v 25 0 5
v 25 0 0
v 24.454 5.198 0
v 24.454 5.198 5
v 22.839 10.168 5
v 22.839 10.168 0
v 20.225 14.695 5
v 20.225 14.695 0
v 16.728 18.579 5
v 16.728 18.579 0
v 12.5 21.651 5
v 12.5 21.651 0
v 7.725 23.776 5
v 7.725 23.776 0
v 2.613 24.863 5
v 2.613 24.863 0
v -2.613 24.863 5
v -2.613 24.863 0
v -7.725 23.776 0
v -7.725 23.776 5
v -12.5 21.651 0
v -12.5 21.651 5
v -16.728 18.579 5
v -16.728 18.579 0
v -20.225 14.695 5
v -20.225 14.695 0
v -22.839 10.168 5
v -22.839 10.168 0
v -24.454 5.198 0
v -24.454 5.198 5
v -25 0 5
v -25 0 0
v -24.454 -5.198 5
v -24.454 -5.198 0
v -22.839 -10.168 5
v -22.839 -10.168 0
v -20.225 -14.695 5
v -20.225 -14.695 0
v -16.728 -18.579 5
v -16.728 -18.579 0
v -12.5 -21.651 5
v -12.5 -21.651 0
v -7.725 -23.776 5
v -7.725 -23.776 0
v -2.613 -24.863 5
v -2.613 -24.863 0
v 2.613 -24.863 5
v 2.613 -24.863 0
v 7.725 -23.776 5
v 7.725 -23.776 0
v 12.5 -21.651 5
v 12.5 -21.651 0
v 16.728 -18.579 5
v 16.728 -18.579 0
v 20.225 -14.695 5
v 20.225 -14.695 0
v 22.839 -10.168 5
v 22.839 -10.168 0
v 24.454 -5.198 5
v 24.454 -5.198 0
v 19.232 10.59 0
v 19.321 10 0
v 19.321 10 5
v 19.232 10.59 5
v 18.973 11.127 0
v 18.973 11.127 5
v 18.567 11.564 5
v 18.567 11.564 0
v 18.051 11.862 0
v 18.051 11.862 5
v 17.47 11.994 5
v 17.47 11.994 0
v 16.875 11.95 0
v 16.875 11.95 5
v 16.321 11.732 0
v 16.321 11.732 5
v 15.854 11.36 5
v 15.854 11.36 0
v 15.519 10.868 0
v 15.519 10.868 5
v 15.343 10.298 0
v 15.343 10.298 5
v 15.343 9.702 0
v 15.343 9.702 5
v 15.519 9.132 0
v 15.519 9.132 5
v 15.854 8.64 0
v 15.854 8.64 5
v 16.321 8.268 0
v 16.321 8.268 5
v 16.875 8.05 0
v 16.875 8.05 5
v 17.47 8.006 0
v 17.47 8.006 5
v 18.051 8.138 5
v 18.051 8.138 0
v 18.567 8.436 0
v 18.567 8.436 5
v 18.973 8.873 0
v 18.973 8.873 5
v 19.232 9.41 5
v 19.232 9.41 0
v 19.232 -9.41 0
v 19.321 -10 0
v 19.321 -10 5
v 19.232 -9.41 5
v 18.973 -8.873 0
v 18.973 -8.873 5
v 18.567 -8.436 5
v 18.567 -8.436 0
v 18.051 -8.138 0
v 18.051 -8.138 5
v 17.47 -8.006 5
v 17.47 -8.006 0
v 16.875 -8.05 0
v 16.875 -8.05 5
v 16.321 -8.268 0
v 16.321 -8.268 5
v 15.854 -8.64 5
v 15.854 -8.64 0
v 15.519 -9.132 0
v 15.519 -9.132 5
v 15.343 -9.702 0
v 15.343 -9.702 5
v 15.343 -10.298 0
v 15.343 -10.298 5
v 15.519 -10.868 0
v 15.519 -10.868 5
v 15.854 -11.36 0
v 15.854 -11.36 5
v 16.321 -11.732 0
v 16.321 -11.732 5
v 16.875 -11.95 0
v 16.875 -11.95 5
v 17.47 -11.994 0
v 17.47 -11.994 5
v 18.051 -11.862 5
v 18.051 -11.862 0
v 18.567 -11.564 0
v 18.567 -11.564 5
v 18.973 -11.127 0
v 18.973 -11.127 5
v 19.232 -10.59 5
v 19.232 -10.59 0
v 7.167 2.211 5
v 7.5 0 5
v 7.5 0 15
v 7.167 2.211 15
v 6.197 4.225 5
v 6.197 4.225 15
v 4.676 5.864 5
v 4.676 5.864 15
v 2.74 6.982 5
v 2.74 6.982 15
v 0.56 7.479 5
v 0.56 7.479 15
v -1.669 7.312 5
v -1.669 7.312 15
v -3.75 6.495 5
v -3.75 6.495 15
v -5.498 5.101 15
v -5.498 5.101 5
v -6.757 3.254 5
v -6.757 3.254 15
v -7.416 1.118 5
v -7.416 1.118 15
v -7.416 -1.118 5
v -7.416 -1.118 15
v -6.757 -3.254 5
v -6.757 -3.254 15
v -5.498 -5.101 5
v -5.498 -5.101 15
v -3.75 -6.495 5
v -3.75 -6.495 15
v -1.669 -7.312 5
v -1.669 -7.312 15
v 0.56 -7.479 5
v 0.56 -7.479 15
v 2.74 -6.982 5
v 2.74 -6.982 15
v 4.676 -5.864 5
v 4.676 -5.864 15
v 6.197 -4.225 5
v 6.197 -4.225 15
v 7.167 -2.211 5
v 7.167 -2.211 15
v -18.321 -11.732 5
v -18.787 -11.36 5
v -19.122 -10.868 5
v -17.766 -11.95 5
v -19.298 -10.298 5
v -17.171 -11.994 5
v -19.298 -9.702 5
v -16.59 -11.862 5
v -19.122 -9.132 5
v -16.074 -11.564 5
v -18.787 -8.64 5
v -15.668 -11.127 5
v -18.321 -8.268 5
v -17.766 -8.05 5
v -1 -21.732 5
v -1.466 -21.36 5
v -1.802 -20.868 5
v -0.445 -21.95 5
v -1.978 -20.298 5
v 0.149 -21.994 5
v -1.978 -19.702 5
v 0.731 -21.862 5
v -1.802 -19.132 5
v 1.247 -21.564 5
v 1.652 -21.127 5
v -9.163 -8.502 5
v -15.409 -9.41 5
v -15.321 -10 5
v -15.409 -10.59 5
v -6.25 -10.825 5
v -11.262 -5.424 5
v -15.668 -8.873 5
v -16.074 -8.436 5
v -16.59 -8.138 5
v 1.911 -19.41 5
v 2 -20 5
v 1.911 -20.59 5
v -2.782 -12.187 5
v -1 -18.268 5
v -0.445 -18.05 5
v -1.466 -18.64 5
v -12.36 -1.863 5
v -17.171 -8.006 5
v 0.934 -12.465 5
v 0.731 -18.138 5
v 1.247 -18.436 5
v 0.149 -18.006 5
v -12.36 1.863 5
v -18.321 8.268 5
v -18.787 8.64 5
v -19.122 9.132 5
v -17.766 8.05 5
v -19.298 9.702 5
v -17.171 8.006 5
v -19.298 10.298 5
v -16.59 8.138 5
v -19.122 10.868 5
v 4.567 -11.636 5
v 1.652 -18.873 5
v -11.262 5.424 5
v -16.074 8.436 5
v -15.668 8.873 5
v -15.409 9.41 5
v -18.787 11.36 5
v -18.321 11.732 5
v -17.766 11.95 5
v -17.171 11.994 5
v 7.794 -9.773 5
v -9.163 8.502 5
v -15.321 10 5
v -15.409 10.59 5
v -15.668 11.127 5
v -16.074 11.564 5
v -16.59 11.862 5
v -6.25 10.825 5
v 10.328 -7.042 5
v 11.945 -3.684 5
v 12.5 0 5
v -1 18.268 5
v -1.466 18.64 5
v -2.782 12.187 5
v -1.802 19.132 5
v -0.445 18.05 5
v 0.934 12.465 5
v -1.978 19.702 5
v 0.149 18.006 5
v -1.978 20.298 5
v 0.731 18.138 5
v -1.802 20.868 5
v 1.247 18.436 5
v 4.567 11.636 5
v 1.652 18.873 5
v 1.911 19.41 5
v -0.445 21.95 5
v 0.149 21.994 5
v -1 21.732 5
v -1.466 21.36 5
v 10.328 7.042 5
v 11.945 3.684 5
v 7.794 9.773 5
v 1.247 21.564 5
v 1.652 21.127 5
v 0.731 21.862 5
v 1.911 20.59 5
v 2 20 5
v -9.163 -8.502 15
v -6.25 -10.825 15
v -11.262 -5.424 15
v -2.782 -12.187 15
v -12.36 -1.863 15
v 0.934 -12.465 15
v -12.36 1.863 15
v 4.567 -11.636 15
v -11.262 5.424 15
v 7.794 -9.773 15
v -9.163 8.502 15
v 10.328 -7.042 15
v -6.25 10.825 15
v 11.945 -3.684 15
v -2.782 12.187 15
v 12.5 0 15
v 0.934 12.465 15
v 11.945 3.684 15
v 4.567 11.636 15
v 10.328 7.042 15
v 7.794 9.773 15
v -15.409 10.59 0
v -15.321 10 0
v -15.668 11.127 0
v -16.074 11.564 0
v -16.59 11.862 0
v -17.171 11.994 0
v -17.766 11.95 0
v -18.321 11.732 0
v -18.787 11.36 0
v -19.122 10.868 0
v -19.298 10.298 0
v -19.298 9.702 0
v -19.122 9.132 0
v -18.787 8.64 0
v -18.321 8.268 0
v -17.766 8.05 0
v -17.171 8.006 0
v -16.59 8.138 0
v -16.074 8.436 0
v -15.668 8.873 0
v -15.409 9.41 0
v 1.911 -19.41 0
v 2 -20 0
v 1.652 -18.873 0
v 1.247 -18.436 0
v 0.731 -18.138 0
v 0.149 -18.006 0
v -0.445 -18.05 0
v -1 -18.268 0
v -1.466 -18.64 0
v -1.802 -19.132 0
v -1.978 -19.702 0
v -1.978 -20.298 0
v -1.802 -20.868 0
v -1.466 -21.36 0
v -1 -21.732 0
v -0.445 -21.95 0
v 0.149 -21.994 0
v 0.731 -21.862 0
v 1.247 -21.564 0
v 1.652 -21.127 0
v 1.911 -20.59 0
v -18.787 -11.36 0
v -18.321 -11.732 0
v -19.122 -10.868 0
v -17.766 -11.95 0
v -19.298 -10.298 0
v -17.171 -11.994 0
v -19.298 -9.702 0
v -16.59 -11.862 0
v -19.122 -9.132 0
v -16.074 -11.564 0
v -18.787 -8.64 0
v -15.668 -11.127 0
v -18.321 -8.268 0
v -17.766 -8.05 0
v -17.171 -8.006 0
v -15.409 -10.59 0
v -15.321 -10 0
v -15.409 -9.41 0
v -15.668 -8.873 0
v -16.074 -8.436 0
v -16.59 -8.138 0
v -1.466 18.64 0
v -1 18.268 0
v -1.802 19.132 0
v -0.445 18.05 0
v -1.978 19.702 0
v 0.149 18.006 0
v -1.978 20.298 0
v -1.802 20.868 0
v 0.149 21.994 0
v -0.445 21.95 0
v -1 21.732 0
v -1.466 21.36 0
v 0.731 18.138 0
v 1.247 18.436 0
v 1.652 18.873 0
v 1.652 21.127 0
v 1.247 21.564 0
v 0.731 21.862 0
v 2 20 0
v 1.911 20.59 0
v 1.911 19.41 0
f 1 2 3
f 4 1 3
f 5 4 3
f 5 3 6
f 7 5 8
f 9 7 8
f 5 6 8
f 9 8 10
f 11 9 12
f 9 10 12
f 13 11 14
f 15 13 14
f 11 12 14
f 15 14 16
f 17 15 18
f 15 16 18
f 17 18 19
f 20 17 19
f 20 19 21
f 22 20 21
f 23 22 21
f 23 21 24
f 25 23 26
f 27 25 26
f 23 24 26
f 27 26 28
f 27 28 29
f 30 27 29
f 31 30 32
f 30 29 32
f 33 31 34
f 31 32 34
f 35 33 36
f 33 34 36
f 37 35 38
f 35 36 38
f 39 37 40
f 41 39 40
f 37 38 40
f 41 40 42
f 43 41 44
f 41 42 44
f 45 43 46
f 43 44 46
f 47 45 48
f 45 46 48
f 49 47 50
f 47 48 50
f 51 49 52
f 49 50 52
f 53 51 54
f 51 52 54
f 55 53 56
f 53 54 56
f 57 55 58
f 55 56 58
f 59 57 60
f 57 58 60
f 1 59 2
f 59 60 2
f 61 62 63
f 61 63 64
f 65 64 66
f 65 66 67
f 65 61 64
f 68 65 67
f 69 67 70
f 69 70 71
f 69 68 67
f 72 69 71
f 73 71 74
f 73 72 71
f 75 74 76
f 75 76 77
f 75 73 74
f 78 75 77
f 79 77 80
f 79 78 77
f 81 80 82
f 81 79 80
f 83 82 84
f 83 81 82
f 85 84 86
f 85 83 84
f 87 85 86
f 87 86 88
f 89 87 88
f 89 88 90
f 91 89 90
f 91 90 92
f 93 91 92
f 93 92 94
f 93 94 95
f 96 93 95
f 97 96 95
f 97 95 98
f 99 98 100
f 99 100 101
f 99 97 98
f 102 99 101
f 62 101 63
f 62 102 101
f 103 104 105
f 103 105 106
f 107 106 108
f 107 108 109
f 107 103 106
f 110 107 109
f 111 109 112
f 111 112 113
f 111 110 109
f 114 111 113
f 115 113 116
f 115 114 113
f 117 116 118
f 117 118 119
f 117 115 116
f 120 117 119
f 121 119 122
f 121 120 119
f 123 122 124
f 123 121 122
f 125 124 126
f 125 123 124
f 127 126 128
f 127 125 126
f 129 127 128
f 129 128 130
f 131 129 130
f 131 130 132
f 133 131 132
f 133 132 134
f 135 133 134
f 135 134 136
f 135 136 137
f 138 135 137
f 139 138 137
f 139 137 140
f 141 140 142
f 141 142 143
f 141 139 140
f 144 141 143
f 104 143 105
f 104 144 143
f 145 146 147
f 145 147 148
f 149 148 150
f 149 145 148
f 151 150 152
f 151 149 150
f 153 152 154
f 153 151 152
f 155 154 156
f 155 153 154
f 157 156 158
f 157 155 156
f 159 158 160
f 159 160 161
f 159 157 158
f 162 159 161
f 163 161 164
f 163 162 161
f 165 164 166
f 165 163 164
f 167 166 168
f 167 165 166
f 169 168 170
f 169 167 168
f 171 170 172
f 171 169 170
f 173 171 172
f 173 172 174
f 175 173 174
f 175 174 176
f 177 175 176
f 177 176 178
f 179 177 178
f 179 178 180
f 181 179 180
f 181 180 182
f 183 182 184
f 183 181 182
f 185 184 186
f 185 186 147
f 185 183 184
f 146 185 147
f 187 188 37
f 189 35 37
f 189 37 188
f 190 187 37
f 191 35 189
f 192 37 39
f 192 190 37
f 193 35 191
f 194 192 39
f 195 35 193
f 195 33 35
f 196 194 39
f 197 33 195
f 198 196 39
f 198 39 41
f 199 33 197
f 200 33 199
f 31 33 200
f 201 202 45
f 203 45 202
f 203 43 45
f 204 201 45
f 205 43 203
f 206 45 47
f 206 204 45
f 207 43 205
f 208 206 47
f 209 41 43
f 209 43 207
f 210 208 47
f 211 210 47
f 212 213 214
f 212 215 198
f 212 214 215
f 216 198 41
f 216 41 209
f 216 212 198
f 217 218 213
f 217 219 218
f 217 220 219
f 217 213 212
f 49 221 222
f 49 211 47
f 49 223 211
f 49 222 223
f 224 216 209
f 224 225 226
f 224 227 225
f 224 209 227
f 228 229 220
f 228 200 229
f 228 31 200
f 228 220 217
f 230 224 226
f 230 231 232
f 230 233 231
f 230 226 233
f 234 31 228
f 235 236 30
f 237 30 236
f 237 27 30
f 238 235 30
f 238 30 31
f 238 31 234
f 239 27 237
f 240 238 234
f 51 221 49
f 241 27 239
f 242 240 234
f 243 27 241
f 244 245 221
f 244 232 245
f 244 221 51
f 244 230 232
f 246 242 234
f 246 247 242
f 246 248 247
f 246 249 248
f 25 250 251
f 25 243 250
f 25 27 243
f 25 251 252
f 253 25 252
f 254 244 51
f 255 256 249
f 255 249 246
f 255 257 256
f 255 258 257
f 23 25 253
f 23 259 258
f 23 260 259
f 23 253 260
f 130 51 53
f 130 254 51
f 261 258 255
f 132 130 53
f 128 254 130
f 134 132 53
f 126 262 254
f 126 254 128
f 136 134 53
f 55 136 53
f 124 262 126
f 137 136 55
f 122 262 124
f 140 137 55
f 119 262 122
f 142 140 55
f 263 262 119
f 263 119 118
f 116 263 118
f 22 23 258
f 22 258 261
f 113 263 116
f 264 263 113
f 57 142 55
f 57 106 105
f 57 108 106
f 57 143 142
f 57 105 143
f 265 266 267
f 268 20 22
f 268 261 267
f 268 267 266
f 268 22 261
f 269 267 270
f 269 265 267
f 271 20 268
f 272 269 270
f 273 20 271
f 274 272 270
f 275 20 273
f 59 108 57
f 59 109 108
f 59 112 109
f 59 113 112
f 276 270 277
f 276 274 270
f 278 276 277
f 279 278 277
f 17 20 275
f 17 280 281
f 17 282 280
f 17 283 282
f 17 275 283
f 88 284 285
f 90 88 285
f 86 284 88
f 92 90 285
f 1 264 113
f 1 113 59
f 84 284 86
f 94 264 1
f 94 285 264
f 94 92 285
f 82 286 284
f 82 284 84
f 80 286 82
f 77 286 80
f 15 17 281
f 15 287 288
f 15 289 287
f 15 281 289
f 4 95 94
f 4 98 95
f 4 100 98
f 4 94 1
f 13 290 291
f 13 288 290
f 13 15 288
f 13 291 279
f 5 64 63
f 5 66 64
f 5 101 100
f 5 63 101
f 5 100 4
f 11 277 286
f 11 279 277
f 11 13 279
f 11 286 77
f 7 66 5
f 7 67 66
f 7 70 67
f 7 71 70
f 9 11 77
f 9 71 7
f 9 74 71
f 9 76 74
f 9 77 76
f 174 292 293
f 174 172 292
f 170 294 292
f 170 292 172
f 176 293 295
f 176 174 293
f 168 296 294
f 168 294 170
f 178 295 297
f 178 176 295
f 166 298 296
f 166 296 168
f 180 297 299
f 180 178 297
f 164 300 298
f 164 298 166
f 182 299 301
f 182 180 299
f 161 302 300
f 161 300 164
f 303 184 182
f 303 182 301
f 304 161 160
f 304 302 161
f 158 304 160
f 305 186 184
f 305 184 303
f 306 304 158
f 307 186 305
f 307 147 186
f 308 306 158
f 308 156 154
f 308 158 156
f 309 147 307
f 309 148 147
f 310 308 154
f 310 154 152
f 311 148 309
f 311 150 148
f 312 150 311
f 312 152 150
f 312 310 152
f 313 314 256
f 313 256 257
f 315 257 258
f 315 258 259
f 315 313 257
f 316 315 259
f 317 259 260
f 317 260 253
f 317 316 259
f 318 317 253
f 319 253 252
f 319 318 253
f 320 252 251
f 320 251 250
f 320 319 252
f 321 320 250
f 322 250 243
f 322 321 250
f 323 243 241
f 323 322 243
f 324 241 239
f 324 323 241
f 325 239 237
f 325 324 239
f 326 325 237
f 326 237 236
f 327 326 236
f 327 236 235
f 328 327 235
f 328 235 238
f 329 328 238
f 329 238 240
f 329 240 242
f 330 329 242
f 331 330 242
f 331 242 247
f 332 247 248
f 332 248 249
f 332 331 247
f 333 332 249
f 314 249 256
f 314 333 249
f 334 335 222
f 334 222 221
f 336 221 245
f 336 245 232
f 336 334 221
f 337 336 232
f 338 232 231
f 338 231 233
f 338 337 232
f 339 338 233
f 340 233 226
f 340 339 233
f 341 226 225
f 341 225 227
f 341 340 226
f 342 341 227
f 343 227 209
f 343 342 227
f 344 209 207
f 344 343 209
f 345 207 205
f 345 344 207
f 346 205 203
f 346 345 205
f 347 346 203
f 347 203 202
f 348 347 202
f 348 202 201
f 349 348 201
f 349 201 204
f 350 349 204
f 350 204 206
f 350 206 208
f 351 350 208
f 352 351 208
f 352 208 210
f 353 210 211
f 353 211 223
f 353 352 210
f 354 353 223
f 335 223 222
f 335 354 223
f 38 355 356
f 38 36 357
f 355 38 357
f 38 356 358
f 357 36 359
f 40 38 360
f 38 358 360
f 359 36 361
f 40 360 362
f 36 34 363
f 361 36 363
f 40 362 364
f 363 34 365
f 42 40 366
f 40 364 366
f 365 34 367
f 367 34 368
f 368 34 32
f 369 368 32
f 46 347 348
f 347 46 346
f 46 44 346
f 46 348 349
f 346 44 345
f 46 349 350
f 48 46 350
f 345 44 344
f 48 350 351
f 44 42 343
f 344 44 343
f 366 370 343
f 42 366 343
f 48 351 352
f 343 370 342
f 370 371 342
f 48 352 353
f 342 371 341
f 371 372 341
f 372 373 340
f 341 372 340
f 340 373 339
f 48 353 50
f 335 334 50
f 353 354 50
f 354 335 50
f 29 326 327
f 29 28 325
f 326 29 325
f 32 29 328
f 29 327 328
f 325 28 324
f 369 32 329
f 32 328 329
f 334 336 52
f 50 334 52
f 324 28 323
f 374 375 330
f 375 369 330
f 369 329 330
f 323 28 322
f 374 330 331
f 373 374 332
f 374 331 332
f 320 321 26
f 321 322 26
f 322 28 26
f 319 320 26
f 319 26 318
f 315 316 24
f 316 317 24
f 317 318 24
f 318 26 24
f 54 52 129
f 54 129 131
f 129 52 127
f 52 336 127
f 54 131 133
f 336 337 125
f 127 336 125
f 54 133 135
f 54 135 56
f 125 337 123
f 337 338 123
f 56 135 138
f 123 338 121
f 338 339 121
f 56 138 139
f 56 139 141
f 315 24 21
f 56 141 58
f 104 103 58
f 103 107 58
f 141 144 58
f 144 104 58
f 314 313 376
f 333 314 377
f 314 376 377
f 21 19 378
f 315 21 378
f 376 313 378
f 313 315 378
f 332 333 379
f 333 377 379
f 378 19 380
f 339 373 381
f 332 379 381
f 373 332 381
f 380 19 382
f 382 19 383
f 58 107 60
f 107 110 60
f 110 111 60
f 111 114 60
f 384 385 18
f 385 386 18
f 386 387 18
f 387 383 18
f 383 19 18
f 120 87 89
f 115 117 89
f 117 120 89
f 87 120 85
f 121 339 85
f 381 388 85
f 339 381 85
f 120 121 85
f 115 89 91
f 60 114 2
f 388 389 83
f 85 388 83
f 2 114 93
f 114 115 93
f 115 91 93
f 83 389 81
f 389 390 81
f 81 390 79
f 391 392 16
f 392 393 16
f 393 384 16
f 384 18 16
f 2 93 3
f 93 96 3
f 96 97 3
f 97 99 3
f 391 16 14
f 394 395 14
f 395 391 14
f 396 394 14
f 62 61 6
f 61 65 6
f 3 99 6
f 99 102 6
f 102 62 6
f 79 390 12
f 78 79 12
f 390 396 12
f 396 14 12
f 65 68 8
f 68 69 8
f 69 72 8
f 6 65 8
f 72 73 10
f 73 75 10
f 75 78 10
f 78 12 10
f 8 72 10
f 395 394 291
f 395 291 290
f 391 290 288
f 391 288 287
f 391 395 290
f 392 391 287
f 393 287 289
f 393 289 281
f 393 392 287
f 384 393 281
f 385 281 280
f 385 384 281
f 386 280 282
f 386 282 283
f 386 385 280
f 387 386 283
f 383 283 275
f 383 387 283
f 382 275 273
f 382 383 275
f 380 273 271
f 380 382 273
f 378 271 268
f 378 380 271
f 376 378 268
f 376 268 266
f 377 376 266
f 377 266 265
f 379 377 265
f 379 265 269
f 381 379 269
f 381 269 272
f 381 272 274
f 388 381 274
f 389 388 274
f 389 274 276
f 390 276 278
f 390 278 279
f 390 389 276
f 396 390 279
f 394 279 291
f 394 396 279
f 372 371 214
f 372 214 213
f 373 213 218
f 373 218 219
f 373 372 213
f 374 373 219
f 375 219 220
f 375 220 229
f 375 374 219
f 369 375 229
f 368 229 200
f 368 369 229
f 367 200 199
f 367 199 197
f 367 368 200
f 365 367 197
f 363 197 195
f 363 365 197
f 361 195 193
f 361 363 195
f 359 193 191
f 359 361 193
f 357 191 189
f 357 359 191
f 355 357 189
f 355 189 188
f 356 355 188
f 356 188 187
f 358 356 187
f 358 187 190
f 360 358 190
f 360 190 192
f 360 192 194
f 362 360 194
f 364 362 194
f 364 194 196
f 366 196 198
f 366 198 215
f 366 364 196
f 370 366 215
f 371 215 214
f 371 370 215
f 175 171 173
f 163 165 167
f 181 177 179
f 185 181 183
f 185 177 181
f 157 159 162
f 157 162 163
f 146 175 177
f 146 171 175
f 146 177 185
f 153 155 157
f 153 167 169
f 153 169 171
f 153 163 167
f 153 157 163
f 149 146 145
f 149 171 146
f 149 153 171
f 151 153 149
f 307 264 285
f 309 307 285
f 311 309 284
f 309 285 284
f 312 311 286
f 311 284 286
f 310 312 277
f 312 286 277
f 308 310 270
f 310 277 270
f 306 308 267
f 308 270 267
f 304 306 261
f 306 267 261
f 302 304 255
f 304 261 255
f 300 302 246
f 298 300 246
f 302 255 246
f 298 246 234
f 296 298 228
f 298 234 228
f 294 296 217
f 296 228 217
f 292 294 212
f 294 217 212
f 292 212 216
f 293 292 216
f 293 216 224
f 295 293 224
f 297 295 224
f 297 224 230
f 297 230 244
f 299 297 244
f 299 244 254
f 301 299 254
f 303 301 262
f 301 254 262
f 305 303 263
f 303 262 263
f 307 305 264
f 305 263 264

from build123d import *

# Parameters (mm, degrees)
SKETCH1_R           = 25
SKETCH1_R_2         = 2
BOSS_EXTRUDE1_DEPTH = 5
SKETCH2_R           = 12.5
SKETCH2_R_2         = 7.5
BOSS_EXTRUDE2_DEPTH = 10


with BuildPart() as part:
    # Sketch1 → Boss-Extrude1 (new body)
    with BuildSketch(Plane.XY):
        Circle(SKETCH1_R)
        with Locations((0, 20)):
            Circle(SKETCH1_R_2, mode=Mode.SUBTRACT)
        with Locations((17.320508076, 10)):
            Circle(SKETCH1_R_2, mode=Mode.SUBTRACT)
        with Locations((17.320508076, -10)):
            Circle(SKETCH1_R_2, mode=Mode.SUBTRACT)
        with Locations((0, -20)):
            Circle(SKETCH1_R_2, mode=Mode.SUBTRACT)
        with Locations((-17.320508076, -10)):
            Circle(SKETCH1_R_2, mode=Mode.SUBTRACT)
        with Locations((-17.320508076, 10)):
            Circle(SKETCH1_R_2, mode=Mode.SUBTRACT)
    extrude(amount=BOSS_EXTRUDE1_DEPTH)

    # Sketch2 → Boss-Extrude2 (add)
    with BuildSketch(Plane.XY.offset(5)):
        Circle(SKETCH2_R)
        Circle(SKETCH2_R_2, mode=Mode.SUBTRACT)
    extrude(amount=BOSS_EXTRUDE2_DEPTH)


solid = part.part
